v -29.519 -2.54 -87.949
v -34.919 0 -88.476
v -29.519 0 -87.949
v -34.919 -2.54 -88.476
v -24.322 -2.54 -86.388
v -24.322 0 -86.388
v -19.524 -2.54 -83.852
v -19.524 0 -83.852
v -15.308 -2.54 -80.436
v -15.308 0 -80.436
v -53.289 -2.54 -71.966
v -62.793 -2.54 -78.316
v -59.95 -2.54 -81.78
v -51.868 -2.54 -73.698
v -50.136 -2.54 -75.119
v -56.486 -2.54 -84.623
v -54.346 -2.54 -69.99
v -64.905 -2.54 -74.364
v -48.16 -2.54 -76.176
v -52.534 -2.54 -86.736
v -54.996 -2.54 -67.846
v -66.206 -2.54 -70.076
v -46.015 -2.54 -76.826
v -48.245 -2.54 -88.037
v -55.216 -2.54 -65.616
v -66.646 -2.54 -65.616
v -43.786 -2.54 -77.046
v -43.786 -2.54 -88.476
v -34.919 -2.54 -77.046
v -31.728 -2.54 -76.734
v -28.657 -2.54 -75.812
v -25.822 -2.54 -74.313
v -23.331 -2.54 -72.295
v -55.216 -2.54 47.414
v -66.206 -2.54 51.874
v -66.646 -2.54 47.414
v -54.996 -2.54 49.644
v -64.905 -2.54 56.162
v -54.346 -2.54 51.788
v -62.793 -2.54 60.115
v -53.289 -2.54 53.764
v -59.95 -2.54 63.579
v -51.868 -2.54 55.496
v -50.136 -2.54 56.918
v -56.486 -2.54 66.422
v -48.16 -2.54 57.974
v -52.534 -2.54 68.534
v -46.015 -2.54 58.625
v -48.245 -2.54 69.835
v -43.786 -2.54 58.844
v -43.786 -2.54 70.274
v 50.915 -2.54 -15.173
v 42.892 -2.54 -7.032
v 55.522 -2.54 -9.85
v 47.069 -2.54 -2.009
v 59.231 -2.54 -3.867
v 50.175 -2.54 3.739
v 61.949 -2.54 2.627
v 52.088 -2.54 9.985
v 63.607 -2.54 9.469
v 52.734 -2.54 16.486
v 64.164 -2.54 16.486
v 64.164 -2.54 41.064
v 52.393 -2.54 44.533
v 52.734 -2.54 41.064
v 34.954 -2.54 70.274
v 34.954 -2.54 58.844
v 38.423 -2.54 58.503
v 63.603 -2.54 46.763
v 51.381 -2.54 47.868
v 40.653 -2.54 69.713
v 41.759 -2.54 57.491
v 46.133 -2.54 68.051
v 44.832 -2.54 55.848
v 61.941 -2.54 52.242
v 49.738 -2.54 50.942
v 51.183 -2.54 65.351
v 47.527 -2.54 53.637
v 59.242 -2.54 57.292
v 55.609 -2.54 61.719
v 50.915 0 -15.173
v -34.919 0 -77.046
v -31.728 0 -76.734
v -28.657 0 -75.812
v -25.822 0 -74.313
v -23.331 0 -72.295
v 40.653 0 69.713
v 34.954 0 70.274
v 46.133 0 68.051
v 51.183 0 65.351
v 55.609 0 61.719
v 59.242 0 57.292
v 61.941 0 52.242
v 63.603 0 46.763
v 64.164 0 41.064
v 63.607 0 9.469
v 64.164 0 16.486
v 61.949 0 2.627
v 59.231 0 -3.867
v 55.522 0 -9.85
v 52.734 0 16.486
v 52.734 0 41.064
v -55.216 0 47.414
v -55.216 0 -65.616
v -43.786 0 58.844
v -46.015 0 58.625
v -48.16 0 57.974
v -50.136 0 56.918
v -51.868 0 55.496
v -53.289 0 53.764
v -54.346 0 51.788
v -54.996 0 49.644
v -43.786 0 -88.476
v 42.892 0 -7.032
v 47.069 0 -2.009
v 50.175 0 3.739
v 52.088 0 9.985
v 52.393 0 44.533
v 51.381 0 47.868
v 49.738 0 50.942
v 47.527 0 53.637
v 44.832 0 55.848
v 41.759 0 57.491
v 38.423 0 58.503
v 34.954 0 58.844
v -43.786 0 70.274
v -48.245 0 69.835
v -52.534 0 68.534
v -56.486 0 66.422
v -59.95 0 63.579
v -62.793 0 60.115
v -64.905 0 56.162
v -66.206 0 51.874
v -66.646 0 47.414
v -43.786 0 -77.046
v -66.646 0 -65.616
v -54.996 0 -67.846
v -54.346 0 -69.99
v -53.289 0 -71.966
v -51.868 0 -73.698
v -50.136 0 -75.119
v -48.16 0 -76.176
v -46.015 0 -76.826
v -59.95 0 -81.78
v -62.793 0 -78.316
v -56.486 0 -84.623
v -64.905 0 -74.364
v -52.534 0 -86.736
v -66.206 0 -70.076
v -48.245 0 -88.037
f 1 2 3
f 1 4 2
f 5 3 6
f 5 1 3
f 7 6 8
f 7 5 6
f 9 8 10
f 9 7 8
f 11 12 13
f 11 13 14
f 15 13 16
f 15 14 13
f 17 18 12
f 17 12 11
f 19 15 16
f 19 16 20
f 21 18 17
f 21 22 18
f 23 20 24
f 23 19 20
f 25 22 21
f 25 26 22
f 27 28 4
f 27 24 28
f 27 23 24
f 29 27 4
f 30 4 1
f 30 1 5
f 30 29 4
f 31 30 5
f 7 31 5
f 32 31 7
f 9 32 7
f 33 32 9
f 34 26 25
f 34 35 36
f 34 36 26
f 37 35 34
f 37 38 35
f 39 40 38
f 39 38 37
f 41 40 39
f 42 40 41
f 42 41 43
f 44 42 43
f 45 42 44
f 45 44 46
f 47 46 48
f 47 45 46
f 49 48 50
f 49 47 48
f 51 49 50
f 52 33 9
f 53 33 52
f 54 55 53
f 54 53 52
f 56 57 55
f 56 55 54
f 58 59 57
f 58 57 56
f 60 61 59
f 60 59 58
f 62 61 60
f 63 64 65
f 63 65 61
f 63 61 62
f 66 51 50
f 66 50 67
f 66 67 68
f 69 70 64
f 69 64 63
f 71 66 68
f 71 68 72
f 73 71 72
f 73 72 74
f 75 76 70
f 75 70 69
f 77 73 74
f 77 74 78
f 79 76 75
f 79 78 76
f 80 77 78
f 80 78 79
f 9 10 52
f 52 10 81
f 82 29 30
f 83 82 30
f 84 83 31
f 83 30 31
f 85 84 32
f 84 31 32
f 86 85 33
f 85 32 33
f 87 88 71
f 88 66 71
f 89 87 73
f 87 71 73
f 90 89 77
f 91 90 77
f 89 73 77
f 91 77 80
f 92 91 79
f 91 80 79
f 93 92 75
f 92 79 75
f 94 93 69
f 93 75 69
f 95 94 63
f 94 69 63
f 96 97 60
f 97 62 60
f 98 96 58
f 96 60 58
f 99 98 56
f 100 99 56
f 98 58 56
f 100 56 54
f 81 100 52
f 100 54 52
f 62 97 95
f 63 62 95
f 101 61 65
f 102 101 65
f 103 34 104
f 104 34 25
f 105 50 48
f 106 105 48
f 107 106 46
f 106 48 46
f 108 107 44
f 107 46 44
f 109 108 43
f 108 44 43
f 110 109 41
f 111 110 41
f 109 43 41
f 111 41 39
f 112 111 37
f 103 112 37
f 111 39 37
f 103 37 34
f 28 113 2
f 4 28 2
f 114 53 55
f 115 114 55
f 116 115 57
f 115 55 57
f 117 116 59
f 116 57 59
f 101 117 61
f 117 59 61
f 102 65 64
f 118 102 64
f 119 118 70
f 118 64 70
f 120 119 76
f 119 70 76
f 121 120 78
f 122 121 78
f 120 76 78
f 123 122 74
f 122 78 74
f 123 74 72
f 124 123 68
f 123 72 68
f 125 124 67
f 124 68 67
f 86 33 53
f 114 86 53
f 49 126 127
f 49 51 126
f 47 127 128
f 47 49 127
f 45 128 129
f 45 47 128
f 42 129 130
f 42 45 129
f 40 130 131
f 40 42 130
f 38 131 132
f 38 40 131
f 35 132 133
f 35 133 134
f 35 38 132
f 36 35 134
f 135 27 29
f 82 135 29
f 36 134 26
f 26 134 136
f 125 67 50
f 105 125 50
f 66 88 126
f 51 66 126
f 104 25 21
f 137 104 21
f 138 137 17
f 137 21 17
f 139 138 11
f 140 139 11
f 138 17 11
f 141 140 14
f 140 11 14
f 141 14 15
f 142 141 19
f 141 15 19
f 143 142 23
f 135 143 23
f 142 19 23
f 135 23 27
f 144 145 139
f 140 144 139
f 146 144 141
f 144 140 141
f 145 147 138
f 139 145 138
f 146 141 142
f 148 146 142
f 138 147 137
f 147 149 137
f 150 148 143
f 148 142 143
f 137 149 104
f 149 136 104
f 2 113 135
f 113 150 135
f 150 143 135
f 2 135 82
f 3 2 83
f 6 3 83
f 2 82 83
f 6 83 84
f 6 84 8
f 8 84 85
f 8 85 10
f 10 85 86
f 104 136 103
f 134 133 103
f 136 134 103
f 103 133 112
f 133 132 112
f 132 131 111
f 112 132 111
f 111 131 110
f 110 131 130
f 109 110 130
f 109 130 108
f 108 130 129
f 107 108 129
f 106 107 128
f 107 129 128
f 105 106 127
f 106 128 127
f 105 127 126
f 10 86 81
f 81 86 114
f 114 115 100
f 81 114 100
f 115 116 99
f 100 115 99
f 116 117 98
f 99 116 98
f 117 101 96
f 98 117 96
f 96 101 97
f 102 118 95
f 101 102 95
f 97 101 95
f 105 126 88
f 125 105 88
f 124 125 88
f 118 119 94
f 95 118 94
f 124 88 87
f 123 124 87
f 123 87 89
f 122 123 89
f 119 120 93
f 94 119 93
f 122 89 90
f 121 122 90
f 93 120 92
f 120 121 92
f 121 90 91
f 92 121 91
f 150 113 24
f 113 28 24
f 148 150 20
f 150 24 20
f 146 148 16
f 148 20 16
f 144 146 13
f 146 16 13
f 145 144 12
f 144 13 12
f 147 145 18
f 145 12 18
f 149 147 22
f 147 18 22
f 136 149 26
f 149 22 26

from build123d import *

# Parameters (mm, degrees)
F1_DEPTH = 2.54
F2_R     = 22.86
F3_R     = 29.21
F4_R     = 44.45
F5_R     = 22.86
F6_R     = 27.94
F8_DEPTH = 2.54


with BuildPart() as f1:
    # F0 (on Front) → F1 (new body)
    with BuildSketch(Plane.XZ):
        Polygon((64.1644249716, 70.274220109), (-66.6455750284, 70.274220109), (-66.6455750284, -88.475779891), (-23.4655750284, -88.475779891), (64.1644249716, -2.115779891), align=None)
    extrude(amount=F1_DEPTH)

    # F2
    f2_edges = [f1.edges().sort_by_distance(p)[0] for p in [
        (-66.645575, -1.27, 70.27422),
    ]]
    fillet(f2_edges, radius=F2_R)

    # F3
    f3_edges = [f1.edges().sort_by_distance(p)[0] for p in [
        (64.164425, -1.27, 70.27422),
    ]]
    fillet(f3_edges, radius=F3_R)

    # F4
    f4_edges = [f1.edges().sort_by_distance(p)[0] for p in [
        (64.164425, -1.27, -2.11578),
    ]]
    fillet(f4_edges, radius=F4_R)

    # F5
    f5_edges = [f1.edges().sort_by_distance(p)[0] for p in [
        (-66.645575, -1.27, -88.47578),
    ]]
    fillet(f5_edges, radius=F5_R)

    # F6
    f6_edges = [f1.edges().sort_by_distance(p)[0] for p in [
        (-23.465575, -1.27, -88.47578),
    ]]
    fillet(f6_edges, radius=F6_R)

    # F7 (on face) → F8 (cut, through all)
    with BuildSketch(Plane.XZ.offset(2.54)):
        with BuildLine():
            ThreePointArc((42.8920452321, -7.0321095397), (50.1746073496, 3.7388999191), (52.7344249716, 16.4863580775))
            Line((52.7344249716, 16.4863580775), (52.7344249716, 41.064220109))
            ThreePointArc((52.7344249716, 41.064220109), (47.5267835411, 53.6365786785), (34.9544249716, 58.844220109))
            Line((34.9544249716, 58.844220109), (-43.7855750284, 58.844220109))
            ThreePointArc((-43.7855750284, 58.844220109), (-51.8678055373, 55.4964506179), (-55.2155750284, 47.414220109))
            Line((-55.2155750284, 47.414220109), (-55.2155750284, -65.615779891))
            ThreePointArc((-55.2155750284, -65.615779891), (-51.8678055373, -73.6980104), (-43.7855750284, -77.045779891))
            Line((-43.7855750284, -77.045779891), (-34.9194176486, -77.045779891))
            ThreePointArc((-34.9194176486, -77.045779891), (-28.6570239441, -75.8119877022), (-23.3306075184, -72.2950136996))
            Line((-23.3306075184, -72.2950136996), (42.8920452321, -7.0321095397))
        make_face()
    extrude(amount=-F8_DEPTH, mode=Mode.SUBTRACT)


solid = f1.part
